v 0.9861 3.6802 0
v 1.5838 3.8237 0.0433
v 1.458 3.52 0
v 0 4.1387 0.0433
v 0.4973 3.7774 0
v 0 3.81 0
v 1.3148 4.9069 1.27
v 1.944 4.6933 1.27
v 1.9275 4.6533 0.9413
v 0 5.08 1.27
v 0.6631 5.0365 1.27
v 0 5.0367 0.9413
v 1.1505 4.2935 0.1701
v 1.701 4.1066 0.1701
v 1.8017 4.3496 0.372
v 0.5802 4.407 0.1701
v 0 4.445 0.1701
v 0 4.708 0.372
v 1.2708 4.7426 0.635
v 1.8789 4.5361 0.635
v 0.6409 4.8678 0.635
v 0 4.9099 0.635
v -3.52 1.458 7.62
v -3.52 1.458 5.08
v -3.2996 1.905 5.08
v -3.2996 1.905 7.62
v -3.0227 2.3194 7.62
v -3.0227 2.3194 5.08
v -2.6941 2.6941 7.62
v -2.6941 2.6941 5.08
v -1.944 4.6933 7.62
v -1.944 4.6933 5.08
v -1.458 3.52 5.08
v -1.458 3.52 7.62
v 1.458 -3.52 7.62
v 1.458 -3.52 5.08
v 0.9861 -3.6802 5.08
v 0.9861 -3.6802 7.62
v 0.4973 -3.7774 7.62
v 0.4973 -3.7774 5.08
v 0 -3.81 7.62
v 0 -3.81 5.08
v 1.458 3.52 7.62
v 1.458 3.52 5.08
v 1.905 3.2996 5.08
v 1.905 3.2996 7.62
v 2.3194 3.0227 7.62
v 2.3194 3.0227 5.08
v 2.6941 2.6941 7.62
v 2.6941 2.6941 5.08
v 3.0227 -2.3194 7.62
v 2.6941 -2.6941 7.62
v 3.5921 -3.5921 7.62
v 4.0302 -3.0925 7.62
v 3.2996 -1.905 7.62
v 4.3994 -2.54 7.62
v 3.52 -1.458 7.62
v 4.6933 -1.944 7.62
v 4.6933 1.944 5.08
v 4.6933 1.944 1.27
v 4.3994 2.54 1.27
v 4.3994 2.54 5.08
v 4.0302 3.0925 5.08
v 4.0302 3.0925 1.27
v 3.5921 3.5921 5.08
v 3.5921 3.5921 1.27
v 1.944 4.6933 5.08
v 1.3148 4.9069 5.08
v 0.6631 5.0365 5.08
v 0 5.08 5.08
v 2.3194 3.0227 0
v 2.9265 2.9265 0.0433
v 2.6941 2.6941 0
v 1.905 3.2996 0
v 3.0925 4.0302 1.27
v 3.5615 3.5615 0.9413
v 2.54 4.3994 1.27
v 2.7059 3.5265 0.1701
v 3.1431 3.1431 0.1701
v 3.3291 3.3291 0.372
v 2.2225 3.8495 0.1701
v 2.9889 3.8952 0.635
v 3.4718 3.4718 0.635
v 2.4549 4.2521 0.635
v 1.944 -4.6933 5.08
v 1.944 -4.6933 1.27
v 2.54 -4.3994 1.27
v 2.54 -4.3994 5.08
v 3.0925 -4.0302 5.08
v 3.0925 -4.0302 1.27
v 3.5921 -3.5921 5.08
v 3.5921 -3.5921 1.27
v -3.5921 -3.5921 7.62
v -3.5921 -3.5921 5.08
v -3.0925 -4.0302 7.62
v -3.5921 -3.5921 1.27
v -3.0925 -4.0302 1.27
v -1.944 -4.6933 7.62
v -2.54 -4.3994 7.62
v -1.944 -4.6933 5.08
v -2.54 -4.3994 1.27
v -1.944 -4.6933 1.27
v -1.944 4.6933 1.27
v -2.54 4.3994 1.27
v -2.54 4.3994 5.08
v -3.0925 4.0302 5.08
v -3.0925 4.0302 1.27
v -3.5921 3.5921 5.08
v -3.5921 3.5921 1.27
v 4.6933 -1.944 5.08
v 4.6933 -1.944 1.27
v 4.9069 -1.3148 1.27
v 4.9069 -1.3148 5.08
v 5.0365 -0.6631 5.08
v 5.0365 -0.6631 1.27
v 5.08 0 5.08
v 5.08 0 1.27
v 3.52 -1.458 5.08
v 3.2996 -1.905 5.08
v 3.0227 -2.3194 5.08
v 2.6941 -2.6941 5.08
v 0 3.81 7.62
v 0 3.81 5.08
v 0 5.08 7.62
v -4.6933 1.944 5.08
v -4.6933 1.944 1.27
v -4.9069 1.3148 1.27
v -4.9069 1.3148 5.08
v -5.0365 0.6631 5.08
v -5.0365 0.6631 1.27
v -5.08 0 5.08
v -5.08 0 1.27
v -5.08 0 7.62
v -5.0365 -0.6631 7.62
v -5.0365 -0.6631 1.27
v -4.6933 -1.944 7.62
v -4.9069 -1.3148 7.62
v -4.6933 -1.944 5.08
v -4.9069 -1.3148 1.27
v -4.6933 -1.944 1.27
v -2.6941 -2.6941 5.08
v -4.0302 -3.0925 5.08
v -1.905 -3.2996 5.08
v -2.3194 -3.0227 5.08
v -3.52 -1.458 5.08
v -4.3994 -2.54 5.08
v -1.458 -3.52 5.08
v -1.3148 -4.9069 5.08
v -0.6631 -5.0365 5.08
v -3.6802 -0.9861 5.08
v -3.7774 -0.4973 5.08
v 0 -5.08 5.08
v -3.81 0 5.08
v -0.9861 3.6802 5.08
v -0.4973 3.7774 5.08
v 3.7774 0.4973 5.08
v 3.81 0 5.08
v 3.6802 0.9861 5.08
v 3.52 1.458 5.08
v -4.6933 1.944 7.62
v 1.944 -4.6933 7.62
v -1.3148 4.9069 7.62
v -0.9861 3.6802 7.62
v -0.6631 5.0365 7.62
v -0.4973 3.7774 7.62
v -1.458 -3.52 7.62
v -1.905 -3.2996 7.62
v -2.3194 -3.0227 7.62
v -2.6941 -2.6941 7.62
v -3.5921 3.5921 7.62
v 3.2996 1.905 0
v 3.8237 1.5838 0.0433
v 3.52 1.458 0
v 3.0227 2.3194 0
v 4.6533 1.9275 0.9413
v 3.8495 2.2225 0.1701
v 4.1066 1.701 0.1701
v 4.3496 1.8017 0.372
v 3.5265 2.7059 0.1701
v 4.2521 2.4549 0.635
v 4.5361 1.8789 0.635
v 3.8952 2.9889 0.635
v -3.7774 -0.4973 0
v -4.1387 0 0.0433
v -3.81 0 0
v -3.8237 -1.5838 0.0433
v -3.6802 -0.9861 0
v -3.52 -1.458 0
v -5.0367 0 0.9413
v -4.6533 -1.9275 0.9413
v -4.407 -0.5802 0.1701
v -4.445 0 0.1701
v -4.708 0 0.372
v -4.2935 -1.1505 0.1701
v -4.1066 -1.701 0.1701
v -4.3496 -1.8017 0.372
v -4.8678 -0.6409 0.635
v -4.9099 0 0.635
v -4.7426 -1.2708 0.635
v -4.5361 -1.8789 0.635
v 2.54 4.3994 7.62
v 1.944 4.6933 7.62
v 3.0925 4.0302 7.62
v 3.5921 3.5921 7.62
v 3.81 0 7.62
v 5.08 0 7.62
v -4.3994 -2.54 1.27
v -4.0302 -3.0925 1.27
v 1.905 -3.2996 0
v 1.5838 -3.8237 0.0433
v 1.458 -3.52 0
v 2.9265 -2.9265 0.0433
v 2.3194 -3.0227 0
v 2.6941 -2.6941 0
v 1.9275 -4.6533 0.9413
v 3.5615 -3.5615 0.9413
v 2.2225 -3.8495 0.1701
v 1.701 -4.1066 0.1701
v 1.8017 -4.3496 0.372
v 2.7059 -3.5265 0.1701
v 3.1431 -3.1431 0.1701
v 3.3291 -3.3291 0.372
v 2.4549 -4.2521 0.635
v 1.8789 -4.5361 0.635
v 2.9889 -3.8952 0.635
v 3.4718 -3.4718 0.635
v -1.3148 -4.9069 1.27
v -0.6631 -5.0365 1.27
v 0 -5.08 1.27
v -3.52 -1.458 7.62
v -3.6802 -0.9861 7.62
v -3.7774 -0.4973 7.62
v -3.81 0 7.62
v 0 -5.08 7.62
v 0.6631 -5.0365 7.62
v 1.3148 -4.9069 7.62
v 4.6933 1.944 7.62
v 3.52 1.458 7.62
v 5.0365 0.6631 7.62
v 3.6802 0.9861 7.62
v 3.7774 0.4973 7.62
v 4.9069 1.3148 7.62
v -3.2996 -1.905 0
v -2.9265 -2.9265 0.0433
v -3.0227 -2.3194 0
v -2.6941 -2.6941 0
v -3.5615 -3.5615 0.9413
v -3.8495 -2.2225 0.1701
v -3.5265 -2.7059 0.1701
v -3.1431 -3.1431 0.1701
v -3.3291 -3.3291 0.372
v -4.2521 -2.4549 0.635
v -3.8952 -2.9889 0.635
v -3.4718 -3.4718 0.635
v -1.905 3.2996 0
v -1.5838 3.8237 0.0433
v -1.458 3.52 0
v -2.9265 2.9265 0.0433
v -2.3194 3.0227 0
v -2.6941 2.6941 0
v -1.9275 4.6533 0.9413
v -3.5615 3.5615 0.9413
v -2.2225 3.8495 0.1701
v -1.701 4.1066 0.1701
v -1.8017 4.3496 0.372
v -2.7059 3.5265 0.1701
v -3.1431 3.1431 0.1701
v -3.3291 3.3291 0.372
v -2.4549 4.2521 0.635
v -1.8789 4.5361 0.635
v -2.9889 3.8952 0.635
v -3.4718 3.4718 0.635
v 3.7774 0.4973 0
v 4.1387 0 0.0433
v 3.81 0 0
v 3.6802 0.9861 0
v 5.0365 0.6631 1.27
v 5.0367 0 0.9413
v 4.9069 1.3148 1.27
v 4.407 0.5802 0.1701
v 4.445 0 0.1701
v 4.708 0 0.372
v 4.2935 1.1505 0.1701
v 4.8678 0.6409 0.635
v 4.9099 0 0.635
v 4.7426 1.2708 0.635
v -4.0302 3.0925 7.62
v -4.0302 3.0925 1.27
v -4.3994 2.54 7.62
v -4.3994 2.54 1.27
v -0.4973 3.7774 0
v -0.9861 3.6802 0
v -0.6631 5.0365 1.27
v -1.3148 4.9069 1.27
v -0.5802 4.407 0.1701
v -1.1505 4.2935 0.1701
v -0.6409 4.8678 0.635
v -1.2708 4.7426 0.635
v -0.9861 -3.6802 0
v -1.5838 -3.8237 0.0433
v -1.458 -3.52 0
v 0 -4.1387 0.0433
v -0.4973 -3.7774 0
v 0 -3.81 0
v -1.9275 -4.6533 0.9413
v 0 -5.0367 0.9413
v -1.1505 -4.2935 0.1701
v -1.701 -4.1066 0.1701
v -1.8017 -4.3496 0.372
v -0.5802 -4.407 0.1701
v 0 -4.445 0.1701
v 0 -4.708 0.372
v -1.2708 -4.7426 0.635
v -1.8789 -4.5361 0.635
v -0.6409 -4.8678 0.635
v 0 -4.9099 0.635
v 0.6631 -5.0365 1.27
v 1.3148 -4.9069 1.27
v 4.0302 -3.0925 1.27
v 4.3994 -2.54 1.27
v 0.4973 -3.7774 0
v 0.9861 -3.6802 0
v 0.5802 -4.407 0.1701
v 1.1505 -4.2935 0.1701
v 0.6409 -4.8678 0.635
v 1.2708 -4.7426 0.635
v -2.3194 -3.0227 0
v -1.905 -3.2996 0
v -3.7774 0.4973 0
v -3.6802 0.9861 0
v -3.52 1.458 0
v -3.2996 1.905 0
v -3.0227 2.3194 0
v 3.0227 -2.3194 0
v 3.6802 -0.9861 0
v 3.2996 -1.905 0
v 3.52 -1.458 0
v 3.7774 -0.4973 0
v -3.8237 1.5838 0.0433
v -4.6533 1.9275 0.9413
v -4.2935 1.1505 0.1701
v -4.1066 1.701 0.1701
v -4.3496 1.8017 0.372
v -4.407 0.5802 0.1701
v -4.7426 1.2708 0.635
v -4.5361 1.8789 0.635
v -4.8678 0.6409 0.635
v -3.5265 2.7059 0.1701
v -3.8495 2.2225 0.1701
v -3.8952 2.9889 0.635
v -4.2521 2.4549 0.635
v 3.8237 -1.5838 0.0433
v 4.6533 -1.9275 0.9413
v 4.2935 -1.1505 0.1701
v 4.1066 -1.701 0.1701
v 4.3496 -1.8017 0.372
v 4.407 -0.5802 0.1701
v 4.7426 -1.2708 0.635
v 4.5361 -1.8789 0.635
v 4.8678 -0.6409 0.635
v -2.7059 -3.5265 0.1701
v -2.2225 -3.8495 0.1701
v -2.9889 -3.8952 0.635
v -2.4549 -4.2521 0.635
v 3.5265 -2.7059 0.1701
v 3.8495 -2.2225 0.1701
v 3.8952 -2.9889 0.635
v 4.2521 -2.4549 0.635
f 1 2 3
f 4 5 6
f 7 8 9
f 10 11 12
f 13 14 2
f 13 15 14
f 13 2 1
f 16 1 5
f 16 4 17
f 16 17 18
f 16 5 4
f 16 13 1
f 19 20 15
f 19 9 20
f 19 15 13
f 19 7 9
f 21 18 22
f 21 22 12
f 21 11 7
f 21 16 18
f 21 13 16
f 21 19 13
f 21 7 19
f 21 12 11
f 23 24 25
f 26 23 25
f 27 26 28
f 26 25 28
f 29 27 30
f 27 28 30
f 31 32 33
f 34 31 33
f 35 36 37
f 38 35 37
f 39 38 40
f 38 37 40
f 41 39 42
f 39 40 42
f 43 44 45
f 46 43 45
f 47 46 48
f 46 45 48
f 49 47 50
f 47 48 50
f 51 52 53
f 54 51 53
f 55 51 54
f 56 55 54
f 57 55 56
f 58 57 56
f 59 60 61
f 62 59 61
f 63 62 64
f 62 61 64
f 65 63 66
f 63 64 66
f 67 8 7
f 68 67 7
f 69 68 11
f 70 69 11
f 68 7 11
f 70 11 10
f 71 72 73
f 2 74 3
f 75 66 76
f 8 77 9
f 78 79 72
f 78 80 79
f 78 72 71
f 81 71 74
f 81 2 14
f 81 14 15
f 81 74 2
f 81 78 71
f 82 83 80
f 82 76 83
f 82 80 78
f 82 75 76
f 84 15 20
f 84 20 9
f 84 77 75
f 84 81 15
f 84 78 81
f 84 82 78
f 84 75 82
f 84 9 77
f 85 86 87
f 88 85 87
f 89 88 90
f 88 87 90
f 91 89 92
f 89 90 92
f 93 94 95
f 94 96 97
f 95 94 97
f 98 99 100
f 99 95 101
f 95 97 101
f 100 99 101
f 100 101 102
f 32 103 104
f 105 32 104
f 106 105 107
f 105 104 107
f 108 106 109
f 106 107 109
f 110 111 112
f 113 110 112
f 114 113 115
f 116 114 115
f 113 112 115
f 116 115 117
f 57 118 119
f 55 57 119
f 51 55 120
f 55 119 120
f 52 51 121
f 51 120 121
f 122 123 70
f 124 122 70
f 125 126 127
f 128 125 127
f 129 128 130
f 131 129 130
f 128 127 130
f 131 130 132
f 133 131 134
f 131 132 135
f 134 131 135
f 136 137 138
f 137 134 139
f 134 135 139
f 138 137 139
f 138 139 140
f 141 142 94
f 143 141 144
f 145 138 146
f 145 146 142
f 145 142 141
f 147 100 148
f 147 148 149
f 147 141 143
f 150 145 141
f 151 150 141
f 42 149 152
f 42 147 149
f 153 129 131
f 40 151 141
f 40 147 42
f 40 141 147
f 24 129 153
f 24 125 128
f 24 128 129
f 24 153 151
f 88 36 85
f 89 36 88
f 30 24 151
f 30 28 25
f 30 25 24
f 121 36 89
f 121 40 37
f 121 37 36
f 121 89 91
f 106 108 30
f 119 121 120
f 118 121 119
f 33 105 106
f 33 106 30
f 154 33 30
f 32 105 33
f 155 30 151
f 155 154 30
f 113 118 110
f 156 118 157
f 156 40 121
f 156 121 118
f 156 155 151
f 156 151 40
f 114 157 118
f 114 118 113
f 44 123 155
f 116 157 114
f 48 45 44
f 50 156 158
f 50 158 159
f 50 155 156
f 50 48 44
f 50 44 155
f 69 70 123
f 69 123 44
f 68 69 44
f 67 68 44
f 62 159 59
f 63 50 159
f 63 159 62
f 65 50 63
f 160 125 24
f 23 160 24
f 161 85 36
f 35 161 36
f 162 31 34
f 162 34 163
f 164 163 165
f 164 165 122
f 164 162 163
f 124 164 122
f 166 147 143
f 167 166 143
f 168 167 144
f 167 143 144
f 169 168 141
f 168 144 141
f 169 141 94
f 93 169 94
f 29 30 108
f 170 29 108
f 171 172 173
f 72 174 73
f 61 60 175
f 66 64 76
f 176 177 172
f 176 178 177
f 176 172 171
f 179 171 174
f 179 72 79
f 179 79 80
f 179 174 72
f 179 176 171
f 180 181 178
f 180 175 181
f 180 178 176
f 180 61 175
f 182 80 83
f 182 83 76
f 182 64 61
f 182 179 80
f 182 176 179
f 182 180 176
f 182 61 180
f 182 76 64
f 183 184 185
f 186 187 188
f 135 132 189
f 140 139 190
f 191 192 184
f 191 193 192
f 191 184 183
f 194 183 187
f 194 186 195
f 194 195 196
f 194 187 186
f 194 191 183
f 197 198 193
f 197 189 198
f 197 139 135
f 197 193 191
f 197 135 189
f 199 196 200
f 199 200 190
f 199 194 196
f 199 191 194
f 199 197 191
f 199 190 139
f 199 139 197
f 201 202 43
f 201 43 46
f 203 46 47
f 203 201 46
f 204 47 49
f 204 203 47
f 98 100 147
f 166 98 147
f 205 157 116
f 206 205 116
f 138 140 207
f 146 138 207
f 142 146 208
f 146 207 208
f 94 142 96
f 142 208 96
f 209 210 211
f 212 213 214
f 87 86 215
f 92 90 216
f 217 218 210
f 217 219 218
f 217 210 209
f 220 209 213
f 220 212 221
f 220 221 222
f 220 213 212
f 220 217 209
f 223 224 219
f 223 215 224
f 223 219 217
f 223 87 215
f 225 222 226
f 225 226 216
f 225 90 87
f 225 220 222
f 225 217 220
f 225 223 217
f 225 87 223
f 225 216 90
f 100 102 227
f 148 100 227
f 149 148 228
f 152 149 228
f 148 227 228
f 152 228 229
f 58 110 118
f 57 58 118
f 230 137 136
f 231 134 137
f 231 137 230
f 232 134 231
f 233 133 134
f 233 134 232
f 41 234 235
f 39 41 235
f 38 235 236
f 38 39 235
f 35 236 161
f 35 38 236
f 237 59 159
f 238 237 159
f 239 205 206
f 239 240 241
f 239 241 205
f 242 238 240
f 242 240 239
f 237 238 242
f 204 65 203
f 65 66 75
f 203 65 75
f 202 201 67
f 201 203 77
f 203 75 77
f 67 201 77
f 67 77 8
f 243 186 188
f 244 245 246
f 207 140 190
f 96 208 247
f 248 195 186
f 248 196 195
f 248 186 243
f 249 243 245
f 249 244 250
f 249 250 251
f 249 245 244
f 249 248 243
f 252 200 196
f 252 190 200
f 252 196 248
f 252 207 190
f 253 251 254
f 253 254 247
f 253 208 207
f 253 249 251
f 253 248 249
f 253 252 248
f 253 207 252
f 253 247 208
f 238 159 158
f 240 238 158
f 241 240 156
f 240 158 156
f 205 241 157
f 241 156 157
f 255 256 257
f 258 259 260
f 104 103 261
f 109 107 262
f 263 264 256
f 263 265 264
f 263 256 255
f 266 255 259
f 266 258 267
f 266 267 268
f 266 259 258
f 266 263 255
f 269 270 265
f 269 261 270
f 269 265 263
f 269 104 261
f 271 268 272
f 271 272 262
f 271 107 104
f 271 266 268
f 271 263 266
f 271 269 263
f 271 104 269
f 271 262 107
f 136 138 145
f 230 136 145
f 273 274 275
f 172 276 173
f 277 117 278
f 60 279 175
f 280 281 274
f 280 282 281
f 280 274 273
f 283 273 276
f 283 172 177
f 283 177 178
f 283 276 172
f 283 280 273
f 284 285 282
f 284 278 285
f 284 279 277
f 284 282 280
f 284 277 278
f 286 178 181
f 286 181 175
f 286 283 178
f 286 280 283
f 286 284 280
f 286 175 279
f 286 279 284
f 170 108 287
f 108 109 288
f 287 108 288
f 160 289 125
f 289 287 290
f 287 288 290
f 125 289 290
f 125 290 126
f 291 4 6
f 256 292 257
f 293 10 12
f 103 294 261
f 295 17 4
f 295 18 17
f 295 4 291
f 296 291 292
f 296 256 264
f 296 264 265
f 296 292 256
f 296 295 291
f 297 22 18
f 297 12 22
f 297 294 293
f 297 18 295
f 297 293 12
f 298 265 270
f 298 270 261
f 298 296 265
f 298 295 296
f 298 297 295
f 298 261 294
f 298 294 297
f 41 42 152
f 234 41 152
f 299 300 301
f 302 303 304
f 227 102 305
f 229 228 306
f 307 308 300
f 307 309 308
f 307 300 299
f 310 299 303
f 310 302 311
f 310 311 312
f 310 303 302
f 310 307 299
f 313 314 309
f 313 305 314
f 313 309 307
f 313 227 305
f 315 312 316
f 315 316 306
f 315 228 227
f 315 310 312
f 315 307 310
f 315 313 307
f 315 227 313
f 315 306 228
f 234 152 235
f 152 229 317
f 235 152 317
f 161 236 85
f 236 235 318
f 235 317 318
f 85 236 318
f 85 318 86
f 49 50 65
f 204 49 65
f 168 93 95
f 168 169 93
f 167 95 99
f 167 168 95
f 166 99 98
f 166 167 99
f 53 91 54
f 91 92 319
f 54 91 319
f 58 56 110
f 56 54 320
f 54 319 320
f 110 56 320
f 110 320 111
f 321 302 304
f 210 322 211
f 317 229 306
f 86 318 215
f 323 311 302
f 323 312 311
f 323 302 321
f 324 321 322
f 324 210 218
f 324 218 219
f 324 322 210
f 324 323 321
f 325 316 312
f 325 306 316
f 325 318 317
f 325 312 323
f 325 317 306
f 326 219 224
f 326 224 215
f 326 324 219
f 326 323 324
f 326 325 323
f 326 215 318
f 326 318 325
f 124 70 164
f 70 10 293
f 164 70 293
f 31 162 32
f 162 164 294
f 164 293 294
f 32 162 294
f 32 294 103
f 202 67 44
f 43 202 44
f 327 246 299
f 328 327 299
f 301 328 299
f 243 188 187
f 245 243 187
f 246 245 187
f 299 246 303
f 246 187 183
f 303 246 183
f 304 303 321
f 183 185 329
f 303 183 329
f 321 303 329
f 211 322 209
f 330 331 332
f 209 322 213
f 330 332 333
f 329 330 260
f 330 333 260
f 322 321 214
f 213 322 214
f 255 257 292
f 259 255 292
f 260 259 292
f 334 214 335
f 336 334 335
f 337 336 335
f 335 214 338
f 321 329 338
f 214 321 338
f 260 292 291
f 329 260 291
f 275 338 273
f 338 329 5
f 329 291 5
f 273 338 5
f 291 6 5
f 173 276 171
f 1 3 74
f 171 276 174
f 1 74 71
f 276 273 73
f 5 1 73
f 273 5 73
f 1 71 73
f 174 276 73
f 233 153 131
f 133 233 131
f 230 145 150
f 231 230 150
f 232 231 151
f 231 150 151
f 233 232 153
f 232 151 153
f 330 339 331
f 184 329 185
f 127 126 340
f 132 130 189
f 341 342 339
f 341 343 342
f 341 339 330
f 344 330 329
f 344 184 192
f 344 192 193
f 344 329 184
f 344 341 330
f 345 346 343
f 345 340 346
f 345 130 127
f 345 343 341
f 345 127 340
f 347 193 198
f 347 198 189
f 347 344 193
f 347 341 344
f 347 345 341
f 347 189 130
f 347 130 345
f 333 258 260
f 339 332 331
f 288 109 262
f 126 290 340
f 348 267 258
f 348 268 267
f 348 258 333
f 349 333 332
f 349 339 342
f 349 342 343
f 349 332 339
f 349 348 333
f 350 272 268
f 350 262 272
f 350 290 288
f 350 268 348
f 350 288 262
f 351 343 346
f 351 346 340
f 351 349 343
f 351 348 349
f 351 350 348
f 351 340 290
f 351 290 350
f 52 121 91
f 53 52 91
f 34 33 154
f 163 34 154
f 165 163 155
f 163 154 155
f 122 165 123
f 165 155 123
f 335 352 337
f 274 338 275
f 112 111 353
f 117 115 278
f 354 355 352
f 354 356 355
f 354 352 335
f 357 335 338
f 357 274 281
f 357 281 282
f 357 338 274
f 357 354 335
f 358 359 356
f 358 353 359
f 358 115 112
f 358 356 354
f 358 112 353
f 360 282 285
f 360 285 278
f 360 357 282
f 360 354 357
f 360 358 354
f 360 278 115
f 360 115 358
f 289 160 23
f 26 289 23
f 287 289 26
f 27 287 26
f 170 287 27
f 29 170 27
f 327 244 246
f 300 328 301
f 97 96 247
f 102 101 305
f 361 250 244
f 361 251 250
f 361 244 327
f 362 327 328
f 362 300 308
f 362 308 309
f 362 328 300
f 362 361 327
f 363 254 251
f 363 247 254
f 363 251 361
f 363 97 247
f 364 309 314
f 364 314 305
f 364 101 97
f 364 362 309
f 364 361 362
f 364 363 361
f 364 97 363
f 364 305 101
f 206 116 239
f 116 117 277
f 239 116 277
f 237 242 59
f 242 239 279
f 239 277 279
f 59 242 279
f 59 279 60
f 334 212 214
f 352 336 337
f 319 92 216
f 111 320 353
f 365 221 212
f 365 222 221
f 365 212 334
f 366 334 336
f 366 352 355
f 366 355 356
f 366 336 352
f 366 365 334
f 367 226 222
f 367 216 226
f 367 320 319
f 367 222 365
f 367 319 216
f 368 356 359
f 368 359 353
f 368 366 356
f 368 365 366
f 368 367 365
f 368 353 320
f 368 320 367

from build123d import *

# Parameters (mm, degrees)
F1_DEPTH = 5.08
F2_DEPTH = 7.62
F3_R     = 1.27


with BuildPart() as f1:
    # F0 (on Top) → F1 (new body)
    with BuildSketch(Plane.XY):
        with BuildLine():
            ThreePointArc((4.6933080252, -1.9440318364), (4.9823892244, -0.9910588358), (5.08, 0))
            Line((5.08, 0), (3.81, 0))
            ThreePointArc((3.81, 0), (3.7367919183, 0.7432941269), (3.5199810189, 1.4580238773))
            Line((3.5199810189, 1.4580238773), (4.6933080252, 1.9440318364))
            ThreePointArc((4.6933080252, 1.9440318364), (4.2238656305, 2.8222967837), (3.5921024484, 3.5921024484))
            Line((3.5921024484, 3.5921024484), (2.6940768363, 2.6940768363))
            ThreePointArc((2.6940768363, 2.6940768363), (2.1167225878, 3.1678992229), (1.4580238773, 3.5199810189))
            Line((1.4580238773, 3.5199810189), (1.9440318364, 4.6933080252))
            ThreePointArc((1.9440318364, 4.6933080252), (0.9910588358, 4.9823892244), (0, 5.08))
            Line((0, 5.08), (0, 3.81))
            ThreePointArc((0, 3.81), (-0.7432941269, 3.7367919183), (-1.4580238773, 3.5199810189))
            Line((-1.4580238773, 3.5199810189), (-1.9440318364, 4.6933080252))
            ThreePointArc((-1.9440318364, 4.6933080252), (-2.8222967837, 4.2238656305), (-3.5921024484, 3.5921024484))
            Line((-3.5921024484, 3.5921024484), (-2.6940768363, 2.6940768363))
            ThreePointArc((-2.6940768363, 2.6940768363), (-3.1678992229, 2.1167225878), (-3.5199810189, 1.4580238773))
            Line((-3.5199810189, 1.4580238773), (-4.6933080252, 1.9440318364))
            ThreePointArc((-4.6933080252, 1.9440318364), (-4.9823892244, 0.9910588358), (-5.08, 0))
            Line((-5.08, 0), (-3.81, 0))
            ThreePointArc((-3.81, 0), (-3.7367919183, -0.7432941269), (-3.5199810189, -1.4580238773))
            Line((-3.5199810189, -1.4580238773), (-4.6933080252, -1.9440318364))
            ThreePointArc((-4.6933080252, -1.9440318364), (-4.2238656305, -2.8222967837), (-3.5921024484, -3.5921024484))
            Line((-3.5921024484, -3.5921024484), (-2.6940768363, -2.6940768363))
            ThreePointArc((-2.6940768363, -2.6940768363), (-2.1167225878, -3.1678992229), (-1.4580238773, -3.5199810189))
            Line((-1.4580238773, -3.5199810189), (-1.9440318364, -4.6933080252))
            ThreePointArc((-1.9440318364, -4.6933080252), (-0.9910588358, -4.9823892244), (0, -5.08))
            Line((0, -5.08), (0, -3.81))
            ThreePointArc((0, -3.81), (0.7432941269, -3.7367919183), (1.4580238773, -3.5199810189))
            Line((1.4580238773, -3.5199810189), (1.9440318364, -4.6933080252))
            ThreePointArc((1.9440318364, -4.6933080252), (2.8222967837, -4.2238656305), (3.5921024484, -3.5921024484))
            Line((3.5921024484, -3.5921024484), (2.6940768363, -2.6940768363))
            ThreePointArc((2.6940768363, -2.6940768363), (3.1678992229, -2.1167225878), (3.5199810189, -1.4580238773))
            Line((3.5199810189, -1.4580238773), (4.6933080252, -1.9440318364))
        make_face()
    extrude(amount=F1_DEPTH)

    # F0 (on Top) → F2 (join)
    with BuildSketch(Plane.XY):
        with BuildLine():
            Line((0, 3.81), (0, 5.08))
            ThreePointArc((0, 5.08), (-0.9910588358, 4.9823892244), (-1.9440318364, 4.6933080252))
            Line((-1.9440318364, 4.6933080252), (-1.4580238773, 3.5199810189))
            ThreePointArc((-1.4580238773, 3.5199810189), (-0.7432941269, 3.7367919183), (0, 3.81))
        make_face()
        with BuildLine():
            Line((2.6940768363, 2.6940768363), (3.5921024484, 3.5921024484))
            ThreePointArc((3.5921024484, 3.5921024484), (2.8222967837, 4.2238656305), (1.9440318364, 4.6933080252))
            Line((1.9440318364, 4.6933080252), (1.4580238773, 3.5199810189))
            ThreePointArc((1.4580238773, 3.5199810189), (2.1167225878, 3.1678992229), (2.6940768363, 2.6940768363))
        make_face()
        with BuildLine():
            Line((3.81, 0), (5.08, 0))
            ThreePointArc((5.08, 0), (4.9823892244, 0.9910588358), (4.6933080252, 1.9440318364))
            Line((4.6933080252, 1.9440318364), (3.5199810189, 1.4580238773))
            ThreePointArc((3.5199810189, 1.4580238773), (3.7367919183, 0.7432941269), (3.81, 0))
        make_face()
        with BuildLine():
            Line((-2.6940768363, 2.6940768363), (-3.5921024484, 3.5921024484))
            ThreePointArc((-3.5921024484, 3.5921024484), (-4.2238656305, 2.8222967837), (-4.6933080252, 1.9440318364))
            Line((-4.6933080252, 1.9440318364), (-3.5199810189, 1.4580238773))
            ThreePointArc((-3.5199810189, 1.4580238773), (-3.1678992229, 2.1167225878), (-2.6940768363, 2.6940768363))
        make_face()
        with BuildLine():
            ThreePointArc((-5.08, 0), (-4.9823892244, -0.9910588358), (-4.6933080252, -1.9440318364))
            Line((-4.6933080252, -1.9440318364), (-3.5199810189, -1.4580238773))
            ThreePointArc((-3.5199810189, -1.4580238773), (-3.7367919183, -0.7432941269), (-3.81, 0))
            Line((-3.81, 0), (-5.08, 0))
        make_face()
        with BuildLine():
            ThreePointArc((-3.5921024484, -3.5921024484), (-2.8222967837, -4.2238656305), (-1.9440318364, -4.6933080252))
            Line((-1.9440318364, -4.6933080252), (-1.4580238773, -3.5199810189))
            ThreePointArc((-1.4580238773, -3.5199810189), (-2.1167225878, -3.1678992229), (-2.6940768363, -2.6940768363))
            Line((-2.6940768363, -2.6940768363), (-3.5921024484, -3.5921024484))
        make_face()
        with BuildLine():
            ThreePointArc((0, -5.08), (0.9910588358, -4.9823892244), (1.9440318364, -4.6933080252))
            Line((1.9440318364, -4.6933080252), (1.4580238773, -3.5199810189))
            ThreePointArc((1.4580238773, -3.5199810189), (0.7432941269, -3.7367919183), (0, -3.81))
            Line((0, -3.81), (0, -5.08))
        make_face()
        with BuildLine():
            ThreePointArc((3.5921024484, -3.5921024484), (4.2238656305, -2.8222967837), (4.6933080252, -1.9440318364))
            Line((4.6933080252, -1.9440318364), (3.5199810189, -1.4580238773))
            ThreePointArc((3.5199810189, -1.4580238773), (3.1678992229, -2.1167225878), (2.6940768363, -2.6940768363))
            Line((2.6940768363, -2.6940768363), (3.5921024484, -3.5921024484))
        make_face()
    extrude(amount=F2_DEPTH)

    # F3
    f3_edges = [f1.edges().sort_by_distance(p)[0] for p in [
        (-1.944032, -4.693308, 0),
    ]]
    fillet(f3_edges, radius=F3_R)


solid = f1.part
